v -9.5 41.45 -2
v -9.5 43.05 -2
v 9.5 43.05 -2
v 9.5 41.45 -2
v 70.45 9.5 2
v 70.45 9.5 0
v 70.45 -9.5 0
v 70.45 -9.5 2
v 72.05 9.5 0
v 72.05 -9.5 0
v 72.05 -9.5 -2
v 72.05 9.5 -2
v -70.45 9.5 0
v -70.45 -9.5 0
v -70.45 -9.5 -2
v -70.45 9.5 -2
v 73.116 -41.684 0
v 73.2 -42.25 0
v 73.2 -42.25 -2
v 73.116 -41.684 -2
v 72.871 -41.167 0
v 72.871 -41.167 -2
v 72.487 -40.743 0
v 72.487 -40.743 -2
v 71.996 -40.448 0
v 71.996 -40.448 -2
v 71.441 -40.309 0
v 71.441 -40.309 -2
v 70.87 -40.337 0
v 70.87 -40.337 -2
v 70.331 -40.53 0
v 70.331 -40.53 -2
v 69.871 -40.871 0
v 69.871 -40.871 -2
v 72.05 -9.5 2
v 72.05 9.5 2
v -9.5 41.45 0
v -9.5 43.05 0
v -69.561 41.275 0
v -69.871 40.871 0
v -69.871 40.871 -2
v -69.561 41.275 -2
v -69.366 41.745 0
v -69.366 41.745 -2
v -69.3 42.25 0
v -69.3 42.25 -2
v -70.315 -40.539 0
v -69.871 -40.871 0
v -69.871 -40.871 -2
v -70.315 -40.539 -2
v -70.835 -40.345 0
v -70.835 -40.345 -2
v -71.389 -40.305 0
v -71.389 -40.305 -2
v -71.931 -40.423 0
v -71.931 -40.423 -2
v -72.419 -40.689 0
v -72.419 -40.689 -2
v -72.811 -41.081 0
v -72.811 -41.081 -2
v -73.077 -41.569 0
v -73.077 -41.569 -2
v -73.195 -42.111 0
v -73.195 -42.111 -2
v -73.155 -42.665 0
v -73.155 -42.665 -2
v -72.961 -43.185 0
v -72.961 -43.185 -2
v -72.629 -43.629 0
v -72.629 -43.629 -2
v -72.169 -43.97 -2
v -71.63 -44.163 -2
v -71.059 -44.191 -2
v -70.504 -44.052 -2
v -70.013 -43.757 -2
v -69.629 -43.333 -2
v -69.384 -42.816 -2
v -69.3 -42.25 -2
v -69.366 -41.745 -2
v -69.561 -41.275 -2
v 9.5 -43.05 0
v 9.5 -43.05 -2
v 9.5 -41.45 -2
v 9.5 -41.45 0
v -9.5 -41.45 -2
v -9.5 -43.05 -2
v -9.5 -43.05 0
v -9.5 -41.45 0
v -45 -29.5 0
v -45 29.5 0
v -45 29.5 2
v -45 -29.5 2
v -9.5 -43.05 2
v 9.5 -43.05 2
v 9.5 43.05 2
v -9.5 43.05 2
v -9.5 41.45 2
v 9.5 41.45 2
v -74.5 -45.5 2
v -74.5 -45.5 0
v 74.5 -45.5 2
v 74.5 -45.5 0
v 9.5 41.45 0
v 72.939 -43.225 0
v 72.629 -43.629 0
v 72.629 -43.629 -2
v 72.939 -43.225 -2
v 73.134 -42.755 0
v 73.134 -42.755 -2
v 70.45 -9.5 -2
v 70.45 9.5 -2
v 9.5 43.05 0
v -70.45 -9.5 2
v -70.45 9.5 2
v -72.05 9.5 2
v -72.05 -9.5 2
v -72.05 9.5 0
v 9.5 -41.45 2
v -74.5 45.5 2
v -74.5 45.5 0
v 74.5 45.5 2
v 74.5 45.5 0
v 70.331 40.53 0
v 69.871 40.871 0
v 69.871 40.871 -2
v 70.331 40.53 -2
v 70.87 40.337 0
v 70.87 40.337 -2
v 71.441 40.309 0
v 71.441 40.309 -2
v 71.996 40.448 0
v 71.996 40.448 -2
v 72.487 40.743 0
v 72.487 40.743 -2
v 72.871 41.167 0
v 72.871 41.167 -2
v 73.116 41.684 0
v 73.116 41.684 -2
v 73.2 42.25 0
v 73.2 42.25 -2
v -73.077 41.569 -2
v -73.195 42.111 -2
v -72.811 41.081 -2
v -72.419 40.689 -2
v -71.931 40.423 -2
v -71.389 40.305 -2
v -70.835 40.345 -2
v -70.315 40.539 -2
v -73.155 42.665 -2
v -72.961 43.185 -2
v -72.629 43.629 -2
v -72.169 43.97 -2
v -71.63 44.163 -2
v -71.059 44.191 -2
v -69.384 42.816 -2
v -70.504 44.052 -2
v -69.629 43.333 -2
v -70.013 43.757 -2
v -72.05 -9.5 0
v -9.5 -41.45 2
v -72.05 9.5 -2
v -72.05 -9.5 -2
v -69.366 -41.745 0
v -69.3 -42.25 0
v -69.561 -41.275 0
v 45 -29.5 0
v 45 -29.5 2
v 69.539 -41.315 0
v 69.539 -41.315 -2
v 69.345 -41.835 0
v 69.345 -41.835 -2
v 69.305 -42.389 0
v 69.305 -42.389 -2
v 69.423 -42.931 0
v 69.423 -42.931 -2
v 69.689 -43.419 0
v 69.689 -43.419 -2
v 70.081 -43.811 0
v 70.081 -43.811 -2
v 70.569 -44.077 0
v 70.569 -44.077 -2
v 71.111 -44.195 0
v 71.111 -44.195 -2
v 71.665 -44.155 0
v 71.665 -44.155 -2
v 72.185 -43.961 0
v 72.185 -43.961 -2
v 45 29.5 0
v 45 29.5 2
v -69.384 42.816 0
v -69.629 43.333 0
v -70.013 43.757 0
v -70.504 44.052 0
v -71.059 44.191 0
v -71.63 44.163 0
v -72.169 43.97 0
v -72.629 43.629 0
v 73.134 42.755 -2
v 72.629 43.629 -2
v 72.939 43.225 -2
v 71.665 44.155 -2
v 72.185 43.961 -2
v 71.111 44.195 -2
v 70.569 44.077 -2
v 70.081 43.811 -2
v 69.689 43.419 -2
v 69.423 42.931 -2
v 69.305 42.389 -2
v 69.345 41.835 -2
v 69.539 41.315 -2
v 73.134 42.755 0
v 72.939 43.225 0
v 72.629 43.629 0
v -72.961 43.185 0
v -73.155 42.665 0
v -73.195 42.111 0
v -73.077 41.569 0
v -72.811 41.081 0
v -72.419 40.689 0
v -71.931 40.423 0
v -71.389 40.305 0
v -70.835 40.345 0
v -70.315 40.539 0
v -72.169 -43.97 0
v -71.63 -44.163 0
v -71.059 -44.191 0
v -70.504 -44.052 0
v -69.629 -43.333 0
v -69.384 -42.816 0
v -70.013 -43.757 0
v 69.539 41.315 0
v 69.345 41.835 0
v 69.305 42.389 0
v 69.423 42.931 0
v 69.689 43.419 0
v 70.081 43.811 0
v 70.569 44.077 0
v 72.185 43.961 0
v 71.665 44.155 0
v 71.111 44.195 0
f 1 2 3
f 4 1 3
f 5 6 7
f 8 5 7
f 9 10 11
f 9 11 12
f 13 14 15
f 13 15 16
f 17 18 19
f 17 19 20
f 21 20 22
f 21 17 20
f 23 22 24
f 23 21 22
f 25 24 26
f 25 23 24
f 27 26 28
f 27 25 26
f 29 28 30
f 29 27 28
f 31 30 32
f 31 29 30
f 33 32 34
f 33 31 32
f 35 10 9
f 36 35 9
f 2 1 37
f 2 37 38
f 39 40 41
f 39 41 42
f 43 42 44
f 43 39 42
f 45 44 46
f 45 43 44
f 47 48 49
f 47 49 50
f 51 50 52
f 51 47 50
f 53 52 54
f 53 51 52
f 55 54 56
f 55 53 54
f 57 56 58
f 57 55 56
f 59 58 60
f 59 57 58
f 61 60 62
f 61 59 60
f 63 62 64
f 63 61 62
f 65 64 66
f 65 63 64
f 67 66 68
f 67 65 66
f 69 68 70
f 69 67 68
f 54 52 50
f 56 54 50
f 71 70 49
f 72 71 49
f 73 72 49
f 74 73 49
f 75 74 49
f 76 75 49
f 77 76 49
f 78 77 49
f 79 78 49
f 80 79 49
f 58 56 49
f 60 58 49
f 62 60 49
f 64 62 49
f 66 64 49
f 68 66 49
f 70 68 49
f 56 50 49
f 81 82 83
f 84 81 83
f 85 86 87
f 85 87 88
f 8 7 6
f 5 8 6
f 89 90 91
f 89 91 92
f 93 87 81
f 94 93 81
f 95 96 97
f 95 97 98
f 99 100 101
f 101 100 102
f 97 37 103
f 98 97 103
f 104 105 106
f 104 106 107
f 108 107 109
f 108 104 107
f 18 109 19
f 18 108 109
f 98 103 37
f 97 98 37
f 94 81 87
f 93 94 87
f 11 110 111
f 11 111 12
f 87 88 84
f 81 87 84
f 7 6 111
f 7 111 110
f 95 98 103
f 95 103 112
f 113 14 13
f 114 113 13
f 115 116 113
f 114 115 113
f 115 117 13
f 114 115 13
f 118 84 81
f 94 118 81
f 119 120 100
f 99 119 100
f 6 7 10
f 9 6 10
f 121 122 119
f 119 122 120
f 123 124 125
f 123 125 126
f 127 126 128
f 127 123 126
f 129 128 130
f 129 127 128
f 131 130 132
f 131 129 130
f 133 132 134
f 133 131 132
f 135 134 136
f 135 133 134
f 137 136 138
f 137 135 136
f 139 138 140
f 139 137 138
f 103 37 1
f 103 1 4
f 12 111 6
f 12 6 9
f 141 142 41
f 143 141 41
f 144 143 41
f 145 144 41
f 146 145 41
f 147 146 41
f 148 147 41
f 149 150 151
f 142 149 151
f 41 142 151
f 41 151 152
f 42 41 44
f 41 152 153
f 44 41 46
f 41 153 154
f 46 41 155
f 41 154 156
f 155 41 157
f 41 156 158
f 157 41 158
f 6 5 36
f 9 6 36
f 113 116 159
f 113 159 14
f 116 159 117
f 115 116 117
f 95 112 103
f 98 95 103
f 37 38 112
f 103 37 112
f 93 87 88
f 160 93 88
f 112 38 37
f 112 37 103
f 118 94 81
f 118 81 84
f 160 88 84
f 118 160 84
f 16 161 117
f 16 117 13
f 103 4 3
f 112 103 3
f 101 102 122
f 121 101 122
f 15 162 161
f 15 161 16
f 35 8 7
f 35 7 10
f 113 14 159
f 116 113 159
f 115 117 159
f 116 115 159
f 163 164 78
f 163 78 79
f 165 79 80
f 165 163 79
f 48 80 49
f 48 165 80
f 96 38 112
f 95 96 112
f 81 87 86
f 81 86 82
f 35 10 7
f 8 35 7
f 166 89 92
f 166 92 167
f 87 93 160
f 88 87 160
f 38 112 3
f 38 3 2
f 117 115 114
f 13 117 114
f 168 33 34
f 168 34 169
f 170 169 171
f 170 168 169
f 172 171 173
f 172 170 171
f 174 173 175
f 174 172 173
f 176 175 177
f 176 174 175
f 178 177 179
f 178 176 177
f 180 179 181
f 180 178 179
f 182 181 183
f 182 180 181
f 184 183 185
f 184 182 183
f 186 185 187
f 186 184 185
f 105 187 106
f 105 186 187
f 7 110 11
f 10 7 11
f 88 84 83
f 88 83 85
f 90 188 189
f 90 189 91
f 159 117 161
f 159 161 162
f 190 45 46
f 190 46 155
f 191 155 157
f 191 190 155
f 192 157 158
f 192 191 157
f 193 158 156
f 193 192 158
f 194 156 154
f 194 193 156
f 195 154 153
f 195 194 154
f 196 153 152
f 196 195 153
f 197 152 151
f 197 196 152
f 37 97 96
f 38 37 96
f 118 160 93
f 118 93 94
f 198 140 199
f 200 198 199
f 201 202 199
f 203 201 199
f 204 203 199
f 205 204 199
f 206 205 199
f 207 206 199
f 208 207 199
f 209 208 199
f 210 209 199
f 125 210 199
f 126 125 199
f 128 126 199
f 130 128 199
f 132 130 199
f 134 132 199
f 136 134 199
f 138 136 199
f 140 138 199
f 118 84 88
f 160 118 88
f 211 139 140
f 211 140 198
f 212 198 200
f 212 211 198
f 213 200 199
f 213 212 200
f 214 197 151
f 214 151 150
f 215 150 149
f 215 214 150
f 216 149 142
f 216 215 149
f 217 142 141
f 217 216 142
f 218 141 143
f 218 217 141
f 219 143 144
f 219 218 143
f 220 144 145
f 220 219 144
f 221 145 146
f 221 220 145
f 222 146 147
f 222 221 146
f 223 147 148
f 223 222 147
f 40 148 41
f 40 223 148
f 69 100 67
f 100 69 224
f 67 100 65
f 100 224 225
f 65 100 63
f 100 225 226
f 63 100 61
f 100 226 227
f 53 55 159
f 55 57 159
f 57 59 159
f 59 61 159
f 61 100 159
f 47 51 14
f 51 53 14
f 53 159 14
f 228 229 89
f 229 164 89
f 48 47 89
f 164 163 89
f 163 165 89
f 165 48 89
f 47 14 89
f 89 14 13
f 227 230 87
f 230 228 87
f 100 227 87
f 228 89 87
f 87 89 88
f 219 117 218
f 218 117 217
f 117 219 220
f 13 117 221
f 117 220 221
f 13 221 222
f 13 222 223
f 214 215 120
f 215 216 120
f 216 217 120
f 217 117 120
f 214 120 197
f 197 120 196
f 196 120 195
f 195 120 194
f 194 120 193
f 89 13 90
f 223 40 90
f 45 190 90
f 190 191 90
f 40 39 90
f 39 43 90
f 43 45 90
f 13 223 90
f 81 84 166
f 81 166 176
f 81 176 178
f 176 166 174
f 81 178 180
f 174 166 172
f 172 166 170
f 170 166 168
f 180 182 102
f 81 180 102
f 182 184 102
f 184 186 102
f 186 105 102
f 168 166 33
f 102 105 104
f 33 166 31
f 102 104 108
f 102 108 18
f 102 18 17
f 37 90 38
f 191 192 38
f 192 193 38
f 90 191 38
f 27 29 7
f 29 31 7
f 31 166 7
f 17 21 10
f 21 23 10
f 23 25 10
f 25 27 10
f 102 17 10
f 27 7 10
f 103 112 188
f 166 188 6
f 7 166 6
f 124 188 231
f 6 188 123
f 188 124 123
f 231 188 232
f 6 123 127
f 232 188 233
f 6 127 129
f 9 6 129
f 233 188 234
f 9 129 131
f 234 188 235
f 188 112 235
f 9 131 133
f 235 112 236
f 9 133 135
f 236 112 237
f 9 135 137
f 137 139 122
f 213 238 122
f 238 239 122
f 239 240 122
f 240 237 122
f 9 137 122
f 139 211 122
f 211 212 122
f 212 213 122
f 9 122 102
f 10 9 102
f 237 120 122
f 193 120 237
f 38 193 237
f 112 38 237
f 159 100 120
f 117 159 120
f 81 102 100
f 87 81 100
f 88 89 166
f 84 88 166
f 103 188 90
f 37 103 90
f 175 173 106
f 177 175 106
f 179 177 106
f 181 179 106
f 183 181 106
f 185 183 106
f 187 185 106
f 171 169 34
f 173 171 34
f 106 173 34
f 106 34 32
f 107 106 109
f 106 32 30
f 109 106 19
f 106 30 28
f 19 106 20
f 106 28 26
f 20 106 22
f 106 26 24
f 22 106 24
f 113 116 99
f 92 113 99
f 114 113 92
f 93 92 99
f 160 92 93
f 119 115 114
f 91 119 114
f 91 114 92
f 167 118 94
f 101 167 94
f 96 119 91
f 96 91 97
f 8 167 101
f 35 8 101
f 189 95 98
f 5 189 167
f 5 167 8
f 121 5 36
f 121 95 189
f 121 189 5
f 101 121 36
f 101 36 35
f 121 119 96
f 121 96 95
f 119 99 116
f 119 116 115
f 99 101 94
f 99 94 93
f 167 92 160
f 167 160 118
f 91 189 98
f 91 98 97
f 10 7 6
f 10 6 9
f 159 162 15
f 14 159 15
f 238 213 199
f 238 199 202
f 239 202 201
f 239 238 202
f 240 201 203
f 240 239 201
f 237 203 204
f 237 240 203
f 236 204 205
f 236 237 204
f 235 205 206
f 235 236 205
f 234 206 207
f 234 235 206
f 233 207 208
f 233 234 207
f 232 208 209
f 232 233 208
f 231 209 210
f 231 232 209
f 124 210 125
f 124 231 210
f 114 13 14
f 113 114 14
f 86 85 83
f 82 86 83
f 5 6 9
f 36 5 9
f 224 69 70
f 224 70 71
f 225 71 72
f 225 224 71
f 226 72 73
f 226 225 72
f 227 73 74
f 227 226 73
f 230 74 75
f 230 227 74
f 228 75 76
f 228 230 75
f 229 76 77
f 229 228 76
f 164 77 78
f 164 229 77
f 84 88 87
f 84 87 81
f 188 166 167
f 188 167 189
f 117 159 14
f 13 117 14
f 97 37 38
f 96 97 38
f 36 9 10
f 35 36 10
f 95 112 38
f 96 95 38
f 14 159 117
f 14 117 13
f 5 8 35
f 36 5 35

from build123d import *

# Parameters (mm, degrees)
F1_DEPTH = 2
F2_DEPTH = 5
F3_DEPTH = 2
F0_W     = 1.6
F0_H     = 9.5
F0_W_2   = 9.5
F0_H_2   = 1.6
F4_DEPTH = 2


# Not quite as in the source:
# - a feature names something its author has since deleted; it is built from what else it names


with BuildPart() as f1:
    # F0 (on Top) → F1 (new body)
    with BuildSketch(Plane.XY):
        with BuildLine():
            Line((72.6288582233, -43.6288582233), (74.5, -45.5))
            Line((74.5, -45.5), (74.5, 0))
            Line((74.5, 0), (72.05, 0))
            Line((72.05, 0), (72.05, -9.5))
            Line((72.05, -9.5), (70.45, -9.5))
            Line((70.45, -9.5), (70.45, 0))
            Line((70.45, 0), (68, 0))
            Line((68, 0), (68, -39))
            Line((68, -39), (69.8711417767, -40.8711417767))
            ThreePointArc((69.8711417767, -40.8711417767), (71.9962326931, -40.4484349116), (73.2, -42.25))
            ThreePointArc((73.2, -42.25), (73.0515650884, -42.9962326931), (72.6288582233, -43.6288582233))
        make_face()
        with BuildLine():
            Line((0, -45.5), (74.5, -45.5))
            Line((74.5, -45.5), (72.6288582233, -43.6288582233))
            ThreePointArc((72.6288582233, -43.6288582233), (69.8711417767, -43.6288582233), (69.8711417767, -40.8711417767))
            Line((69.8711417767, -40.8711417767), (68, -39))
            Line((68, -39), (0, -39))
            Line((0, -39), (0, -41.45))
            Line((0, -41.45), (9.5, -41.45))
            Line((9.5, -41.45), (9.5, -43.05))
            Line((9.5, -43.05), (0, -43.05))
            Line((0, -43.05), (0, -45.5))
        make_face()
        with BuildLine():
            Line((-74.5, -45.5), (0, -45.5))
            Line((0, -45.5), (0, -43.05))
            Line((0, -43.05), (-9.5, -43.05))
            Line((-9.5, -43.05), (-9.5, -41.45))
            Line((-9.5, -41.45), (0, -41.45))
            Line((0, -41.45), (0, -39))
            Line((0, -39), (-68, -39))
            Line((-68, -39), (-69.8711417767, -40.8711417767))
            ThreePointArc((-69.8711417767, -40.8711417767), (-69.4484349116, -41.5037673069), (-69.3, -42.25))
            ThreePointArc((-69.3, -42.25), (-70.5037673069, -44.0515650884), (-72.6288582233, -43.6288582233))
            Line((-72.6288582233, -43.6288582233), (-74.5, -45.5))
        make_face()
        with BuildLine():
            Line((72.05, 0), (74.5, 0))
            Line((74.5, 0), (74.5, 45.5))
            Line((74.5, 45.5), (72.6288582233, 43.6288582233))
            ThreePointArc((72.6288582233, 43.6288582233), (73.0515650884, 42.9962326931), (73.2, 42.25))
            ThreePointArc((73.2, 42.25), (71.9962326931, 40.4484349116), (69.8711417767, 40.8711417767))
            Line((69.8711417767, 40.8711417767), (68, 39))
            Line((68, 39), (68, 0))
            Line((68, 0), (70.45, 0))
            Line((70.45, 0), (70.45, 9.5))
            Line((70.45, 9.5), (72.05, 9.5))
            Line((72.05, 9.5), (72.05, 0))
        make_face()
        with BuildLine():
            ThreePointArc((69.8711417767, -40.8711417767), (69.8711417767, -43.6288582233), (72.6288582233, -43.6288582233))
            Line((72.6288582233, -43.6288582233), (69.8711417767, -40.8711417767))
        make_face()
        with BuildLine():
            Line((69.8711417767, -40.8711417767), (72.6288582233, -43.6288582233))
            ThreePointArc((72.6288582233, -43.6288582233), (73.0515650884, -42.9962326931), (73.2, -42.25))
            ThreePointArc((73.2, -42.25), (71.9962326931, -40.4484349116), (69.8711417767, -40.8711417767))
        make_face()
        with BuildLine():
            Line((-74.5, 0), (-74.5, -45.5))
            Line((-74.5, -45.5), (-72.6288582233, -43.6288582233))
            ThreePointArc((-72.6288582233, -43.6288582233), (-72.6288582233, -40.8711417767), (-69.8711417767, -40.8711417767))
            Line((-69.8711417767, -40.8711417767), (-68, -39))
            Line((-68, -39), (-68, 0))
            Line((-68, 0), (-70.45, 0))
            Line((-70.45, 0), (-70.45, -9.5))
            Line((-70.45, -9.5), (-72.05, -9.5))
            Line((-72.05, -9.5), (-72.05, 0))
            Line((-72.05, 0), (-74.5, 0))
        make_face()
        with BuildLine():
            Line((72.6288582233, 43.6288582233), (74.5, 45.5))
            Line((74.5, 45.5), (0, 45.5))
            Line((0, 45.5), (0, 43.05))
            Line((0, 43.05), (9.5, 43.05))
            Line((9.5, 43.05), (9.5, 41.45))
            Line((9.5, 41.45), (0, 41.45))
            Line((0, 41.45), (0, 39))
            Line((0, 39), (68, 39))
            Line((68, 39), (69.8711417767, 40.8711417767))
            ThreePointArc((69.8711417767, 40.8711417767), (69.8711417767, 43.6288582233), (72.6288582233, 43.6288582233))
        make_face()
        with BuildLine():
            Line((-74.5, 45.5), (-74.5, 0))
            Line((-74.5, 0), (-72.05, 0))
            Line((-72.05, 0), (-72.05, 9.5))
            Line((-72.05, 9.5), (-70.45, 9.5))
            Line((-70.45, 9.5), (-70.45, 0))
            Line((-70.45, 0), (-68, 0))
            Line((-68, 0), (-68, 39))
            Line((-68, 39), (-69.8711417767, 40.8711417767))
            ThreePointArc((-69.8711417767, 40.8711417767), (-72.6288582233, 40.8711417767), (-72.6288582233, 43.6288582233))
            Line((-72.6288582233, 43.6288582233), (-74.5, 45.5))
        make_face()
        with BuildLine():
            ThreePointArc((-69.8711417767, -40.8711417767), (-72.6288582233, -40.8711417767), (-72.6288582233, -43.6288582233))
            Line((-72.6288582233, -43.6288582233), (-69.8711417767, -40.8711417767))
        make_face()
        with BuildLine():
            Line((-69.8711417767, -40.8711417767), (-72.6288582233, -43.6288582233))
            ThreePointArc((-72.6288582233, -43.6288582233), (-70.5037673069, -44.0515650884), (-69.3, -42.25))
            ThreePointArc((-69.3, -42.25), (-69.4484349116, -41.5037673069), (-69.8711417767, -40.8711417767))
        make_face()
        with BuildLine():
            Line((0, 43.05), (0, 45.5))
            Line((0, 45.5), (-74.5, 45.5))
            Line((-74.5, 45.5), (-72.6288582233, 43.6288582233))
            ThreePointArc((-72.6288582233, 43.6288582233), (-70.5037673069, 44.0515650884), (-69.3, 42.25))
            ThreePointArc((-69.3, 42.25), (-69.4484349116, 41.5037673069), (-69.8711417767, 40.8711417767))
            Line((-69.8711417767, 40.8711417767), (-68, 39))
            Line((-68, 39), (0, 39))
            Line((0, 39), (0, 41.45))
            Line((0, 41.45), (-9.5, 41.45))
            Line((-9.5, 41.45), (-9.5, 43.05))
            Line((-9.5, 43.05), (0, 43.05))
        make_face()
        with BuildLine():
            ThreePointArc((73.2, 42.25), (73.0515650884, 42.9962326931), (72.6288582233, 43.6288582233))
            Line((72.6288582233, 43.6288582233), (69.8711417767, 40.8711417767))
            ThreePointArc((69.8711417767, 40.8711417767), (71.9962326931, 40.4484349116), (73.2, 42.25))
        make_face()
        with BuildLine():
            Line((69.8711417767, 40.8711417767), (72.6288582233, 43.6288582233))
            ThreePointArc((72.6288582233, 43.6288582233), (69.8711417767, 43.6288582233), (69.8711417767, 40.8711417767))
        make_face()
        Polygon((0, -39), (68, -39), (68, 0), (45, 0), (45, -29.5), (0, -29.5), align=None)
        Polygon((-68, -39), (0, -39), (0, -29.5), (-45, -29.5), (-45, 0), (-68, 0), align=None)
        Polygon((45, 0), (68, 0), (68, 39), (0, 39), (0, 29.5), (45, 29.5), align=None)
        with BuildLine():
            ThreePointArc((-69.3, 42.25), (-70.5037673069, 44.0515650884), (-72.6288582233, 43.6288582233))
            Line((-72.6288582233, 43.6288582233), (-69.8711417767, 40.8711417767))
            ThreePointArc((-69.8711417767, 40.8711417767), (-69.4484349116, 41.5037673069), (-69.3, 42.25))
        make_face()
        with BuildLine():
            Line((-69.8711417767, 40.8711417767), (-72.6288582233, 43.6288582233))
            ThreePointArc((-72.6288582233, 43.6288582233), (-72.6288582233, 40.8711417767), (-69.8711417767, 40.8711417767))
        make_face()
        Polygon((-45, -29.5), (0, -29.5), (45, -29.5), (45, 0), (45, 29.5), (0, 29.5), (-45, 29.5), (-45, 0), align=None)
        Polygon((-68, 39), (-68, 0), (-45, 0), (-45, 29.5), (0, 29.5), (0, 39), align=None)
    extrude(amount=F1_DEPTH)

    # F0 (on Top) → F2 (cut)
    with BuildSketch(Plane.XY):
        Polygon((-45, -29.5), (0, -29.5), (45, -29.5), (45, 0), (45, 29.5), (0, 29.5), (-45, 29.5), (-45, 0), align=None)
    extrude(amount=F2_DEPTH, mode=Mode.SUBTRACT)

    # F0 (on Top) → F3 (join)
    with BuildSketch(Plane.XY):
        with BuildLine():
            ThreePointArc((73.2, 42.25), (73.0515650884, 42.9962326931), (72.6288582233, 43.6288582233))
            Line((72.6288582233, 43.6288582233), (69.8711417767, 40.8711417767))
            ThreePointArc((69.8711417767, 40.8711417767), (71.9962326931, 40.4484349116), (73.2, 42.25))
        make_face()
        with BuildLine():
            Line((69.8711417767, 40.8711417767), (72.6288582233, 43.6288582233))
            ThreePointArc((72.6288582233, 43.6288582233), (69.8711417767, 43.6288582233), (69.8711417767, 40.8711417767))
        make_face()
        with BuildLine():
            Line((-69.8711417767, 40.8711417767), (-72.6288582233, 43.6288582233))
            ThreePointArc((-72.6288582233, 43.6288582233), (-72.6288582233, 40.8711417767), (-69.8711417767, 40.8711417767))
        make_face()
        with BuildLine():
            ThreePointArc((-69.3, 42.25), (-70.5037673069, 44.0515650884), (-72.6288582233, 43.6288582233))
            Line((-72.6288582233, 43.6288582233), (-69.8711417767, 40.8711417767))
            ThreePointArc((-69.8711417767, 40.8711417767), (-69.4484349116, 41.5037673069), (-69.3, 42.25))
        make_face()
        with BuildLine():
            Line((-69.8711417767, -40.8711417767), (-72.6288582233, -43.6288582233))
            ThreePointArc((-72.6288582233, -43.6288582233), (-70.5037673069, -44.0515650884), (-69.3, -42.25))
            ThreePointArc((-69.3, -42.25), (-69.4484349116, -41.5037673069), (-69.8711417767, -40.8711417767))
        make_face()
        with BuildLine():
            ThreePointArc((-69.8711417767, -40.8711417767), (-72.6288582233, -40.8711417767), (-72.6288582233, -43.6288582233))
            Line((-72.6288582233, -43.6288582233), (-69.8711417767, -40.8711417767))
        make_face()
        with BuildLine():
            ThreePointArc((69.8711417767, -40.8711417767), (69.8711417767, -43.6288582233), (72.6288582233, -43.6288582233))
            Line((72.6288582233, -43.6288582233), (69.8711417767, -40.8711417767))
        make_face()
        with BuildLine():
            Line((69.8711417767, -40.8711417767), (72.6288582233, -43.6288582233))
            ThreePointArc((72.6288582233, -43.6288582233), (73.0515650884, -42.9962326931), (73.2, -42.25))
            ThreePointArc((73.2, -42.25), (71.9962326931, -40.4484349116), (69.8711417767, -40.8711417767))
        make_face()
    extrude(amount=-F3_DEPTH)


with BuildPart() as f3:
    # F0 (on Top) → F3, piece 2 (new body)
    with BuildSketch(Plane.XY):
        with Locations((-71.25, -4.75)):
            Rectangle(F0_W, F0_H)
        with Locations((-71.25, 4.75)):
            Rectangle(F0_W, F0_H)
    extrude(amount=-F3_DEPTH)


with BuildPart() as f3b:
    # F0 (on Top) → F3, piece 3 (new body)
    with BuildSketch(Plane.XY):
        with Locations((-4.75, 42.25)):
            Rectangle(F0_W_2, F0_H_2)
        with Locations((4.75, 42.25)):
            Rectangle(F0_W_2, F0_H_2)
    extrude(amount=-F3_DEPTH)


with BuildPart() as f3c:
    # F0 (on Top) → F3, piece 4 (new body)
    with BuildSketch(Plane.XY):
        with Locations((71.25, 4.75)):
            Rectangle(F0_W, F0_H)
        with Locations((71.25, -4.75)):
            Rectangle(F0_W, F0_H)
    extrude(amount=-F3_DEPTH)


with BuildPart() as f3d:
    # F0 (on Top) → F3, piece 5 (new body)
    with BuildSketch(Plane.XY):
        with Locations((4.75, -42.25)):
            Rectangle(F0_W_2, F0_H_2)
        with Locations((-4.75, -42.25)):
            Rectangle(F0_W_2, F0_H_2)
    extrude(amount=-F3_DEPTH)


with BuildPart() as f4:
    # F0 (on Top) → F4 (new body)
    with BuildSketch(Plane.XY):
        with Locations((-4.75, 42.25)):
            Rectangle(F0_W_2, F0_H_2)
        with Locations((4.75, 42.25)):
            Rectangle(F0_W_2, F0_H_2)
    extrude(amount=F4_DEPTH)


with BuildPart() as f4b:
    # F0 (on Top) → F4, piece 2 (new body)
    with BuildSketch(Plane.XY):
        with Locations((-71.25, 4.75)):
            Rectangle(F0_W, F0_H)
        with Locations((-71.25, -4.75)):
            Rectangle(F0_W, F0_H)
    extrude(amount=F4_DEPTH)


with BuildPart() as f4c:
    # F0 (on Top) → F4, piece 3 (new body)
    with BuildSketch(Plane.XY):
        with Locations((71.25, 4.75)):
            Rectangle(F0_W, F0_H)
        with Locations((71.25, -4.75)):
            Rectangle(F0_W, F0_H)
    extrude(amount=F4_DEPTH)


with BuildPart() as f4d:
    # F0 (on Top) → F4, piece 4 (new body)
    with BuildSketch(Plane.XY):
        with Locations((-4.75, -42.25)):
            Rectangle(F0_W_2, F0_H_2)
        with Locations((4.75, -42.25)):
            Rectangle(F0_W_2, F0_H_2)
    extrude(amount=F4_DEPTH)


solid = Compound([f1.part, f3.part, f3b.part, f3c.part, f3d.part, f4.part, f4b.part, f4c.part, f4d.part])
